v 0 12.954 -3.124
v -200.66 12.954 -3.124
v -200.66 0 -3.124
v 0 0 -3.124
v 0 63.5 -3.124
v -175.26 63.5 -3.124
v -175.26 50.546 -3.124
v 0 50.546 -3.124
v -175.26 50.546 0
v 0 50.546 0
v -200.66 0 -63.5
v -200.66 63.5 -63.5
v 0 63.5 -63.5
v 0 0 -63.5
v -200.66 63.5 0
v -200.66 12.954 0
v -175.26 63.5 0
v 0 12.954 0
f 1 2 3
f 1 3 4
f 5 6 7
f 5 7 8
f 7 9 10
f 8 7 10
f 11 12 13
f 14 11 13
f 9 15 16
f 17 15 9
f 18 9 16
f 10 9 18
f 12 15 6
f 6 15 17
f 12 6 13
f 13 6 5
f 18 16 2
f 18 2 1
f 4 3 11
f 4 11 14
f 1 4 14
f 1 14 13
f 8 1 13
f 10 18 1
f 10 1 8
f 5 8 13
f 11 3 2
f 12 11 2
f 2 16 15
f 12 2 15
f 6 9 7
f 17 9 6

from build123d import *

# Parameters (mm, degrees)
F0_W     = 200.66
F0_H     = 63.5
F1_DEPTH = 63.5
F2_W     = 200.66
F2_H     = 12.954
F2_W_2   = 175.26
F3_DEPTH = 3.1242


with BuildPart() as f1:
    # F0 (on Top) → F1 (new body)
    with BuildSketch(Plane.XY):
        with Locations((-100.33, 31.75)):
            Rectangle(F0_W, F0_H)
    extrude(amount=-F1_DEPTH)

    # F2 (on face) → F3 (cut)
    with BuildSketch(Plane.XY):
        with Locations((-100.33, 6.477)):
            Rectangle(F2_W, F2_H)
        with Locations((-87.63, 57.023)):
            Rectangle(F2_W_2, F2_H)
    extrude(amount=-F3_DEPTH, mode=Mode.SUBTRACT)


solid = f1.part
